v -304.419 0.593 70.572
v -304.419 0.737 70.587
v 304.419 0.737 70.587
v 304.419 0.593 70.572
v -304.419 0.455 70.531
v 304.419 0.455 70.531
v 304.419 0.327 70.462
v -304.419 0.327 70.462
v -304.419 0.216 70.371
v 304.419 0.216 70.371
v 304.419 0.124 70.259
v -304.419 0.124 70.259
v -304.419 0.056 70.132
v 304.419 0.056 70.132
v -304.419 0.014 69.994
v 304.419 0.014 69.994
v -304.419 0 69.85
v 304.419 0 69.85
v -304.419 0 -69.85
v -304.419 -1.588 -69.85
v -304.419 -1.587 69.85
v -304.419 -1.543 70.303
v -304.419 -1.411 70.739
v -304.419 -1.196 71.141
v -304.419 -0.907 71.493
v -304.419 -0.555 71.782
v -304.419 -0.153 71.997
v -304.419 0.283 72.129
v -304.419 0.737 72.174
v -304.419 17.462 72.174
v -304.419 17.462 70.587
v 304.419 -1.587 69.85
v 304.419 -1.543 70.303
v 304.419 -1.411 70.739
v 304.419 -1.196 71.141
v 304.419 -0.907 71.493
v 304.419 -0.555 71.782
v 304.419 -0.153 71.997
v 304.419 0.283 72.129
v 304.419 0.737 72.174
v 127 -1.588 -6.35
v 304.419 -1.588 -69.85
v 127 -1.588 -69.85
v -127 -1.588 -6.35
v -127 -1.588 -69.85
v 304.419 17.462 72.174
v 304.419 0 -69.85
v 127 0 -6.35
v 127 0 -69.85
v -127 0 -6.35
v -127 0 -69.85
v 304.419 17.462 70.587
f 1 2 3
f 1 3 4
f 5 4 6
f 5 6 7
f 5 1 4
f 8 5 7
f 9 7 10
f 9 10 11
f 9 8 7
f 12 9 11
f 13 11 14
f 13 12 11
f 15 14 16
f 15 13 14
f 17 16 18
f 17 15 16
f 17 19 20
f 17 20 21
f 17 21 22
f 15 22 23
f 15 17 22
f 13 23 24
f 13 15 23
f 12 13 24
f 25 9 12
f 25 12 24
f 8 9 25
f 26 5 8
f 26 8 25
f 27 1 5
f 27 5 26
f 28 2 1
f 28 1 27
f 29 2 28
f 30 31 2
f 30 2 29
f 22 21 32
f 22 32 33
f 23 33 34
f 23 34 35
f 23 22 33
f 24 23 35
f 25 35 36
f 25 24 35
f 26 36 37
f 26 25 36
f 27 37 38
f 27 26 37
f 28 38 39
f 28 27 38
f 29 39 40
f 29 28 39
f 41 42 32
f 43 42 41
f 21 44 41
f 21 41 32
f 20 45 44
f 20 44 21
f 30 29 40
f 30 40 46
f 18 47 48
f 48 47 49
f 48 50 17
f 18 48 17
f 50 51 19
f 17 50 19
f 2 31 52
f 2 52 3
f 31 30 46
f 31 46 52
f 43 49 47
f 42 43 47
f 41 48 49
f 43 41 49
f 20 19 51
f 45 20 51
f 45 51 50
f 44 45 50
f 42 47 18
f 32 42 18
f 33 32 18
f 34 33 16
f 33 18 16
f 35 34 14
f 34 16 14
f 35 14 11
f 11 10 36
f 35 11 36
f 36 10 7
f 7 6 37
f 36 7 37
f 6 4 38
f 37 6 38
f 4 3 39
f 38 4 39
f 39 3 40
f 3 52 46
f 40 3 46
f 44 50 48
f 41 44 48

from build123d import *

# Parameters (mm, degrees)
BASE_FLANGE1_DEPTH = 1.5875
EDGE_FLANGE1_DEPTH = 608.838


# Sheet-metal steps are written as plain solids
with BuildPart() as part:
    # Sketch1 → Base-Flange1 (new body)
    with BuildSketch(Plane(origin=(0, 0, 0), x_dir=(1, 0, 0), z_dir=(0, 1, 0))):
        Polygon((-304.419, 69.85), (-127, 69.85), (-127, 6.35), (127, 6.35), (127, 69.85), (304.419, 69.85), (304.419, -69.85), (-304.419, -69.85), align=None)
    extrude(amount=-BASE_FLANGE1_DEPTH)

    # Edge-Flange1 section (across the edge) → Edge-Flange1 (add)
    with BuildSketch(Plane(origin=(-304.419, 0, 70.5866), x_dir=(0, 0, -1), z_dir=(1, 0, 0))):
        with BuildLine():
            Line((-1.5875, 0.7366), (-1.5875, 17.4625))
            Line((-1.5875, 17.4625), (0, 17.4625))
            Line((0, 17.4625), (0, 0.7366))
            ThreePointArc((0, 0.7366), (0.215745145, 0.215745145), (0.7366, 0))
            Line((0.7366, 0), (0.7366, -1.5875))
            ThreePointArc((0.7366, -1.5875), (-0.90678687, -0.90678687), (-1.5875, 0.7366))
        make_face()
    extrude(amount=EDGE_FLANGE1_DEPTH)


solid = part.part
